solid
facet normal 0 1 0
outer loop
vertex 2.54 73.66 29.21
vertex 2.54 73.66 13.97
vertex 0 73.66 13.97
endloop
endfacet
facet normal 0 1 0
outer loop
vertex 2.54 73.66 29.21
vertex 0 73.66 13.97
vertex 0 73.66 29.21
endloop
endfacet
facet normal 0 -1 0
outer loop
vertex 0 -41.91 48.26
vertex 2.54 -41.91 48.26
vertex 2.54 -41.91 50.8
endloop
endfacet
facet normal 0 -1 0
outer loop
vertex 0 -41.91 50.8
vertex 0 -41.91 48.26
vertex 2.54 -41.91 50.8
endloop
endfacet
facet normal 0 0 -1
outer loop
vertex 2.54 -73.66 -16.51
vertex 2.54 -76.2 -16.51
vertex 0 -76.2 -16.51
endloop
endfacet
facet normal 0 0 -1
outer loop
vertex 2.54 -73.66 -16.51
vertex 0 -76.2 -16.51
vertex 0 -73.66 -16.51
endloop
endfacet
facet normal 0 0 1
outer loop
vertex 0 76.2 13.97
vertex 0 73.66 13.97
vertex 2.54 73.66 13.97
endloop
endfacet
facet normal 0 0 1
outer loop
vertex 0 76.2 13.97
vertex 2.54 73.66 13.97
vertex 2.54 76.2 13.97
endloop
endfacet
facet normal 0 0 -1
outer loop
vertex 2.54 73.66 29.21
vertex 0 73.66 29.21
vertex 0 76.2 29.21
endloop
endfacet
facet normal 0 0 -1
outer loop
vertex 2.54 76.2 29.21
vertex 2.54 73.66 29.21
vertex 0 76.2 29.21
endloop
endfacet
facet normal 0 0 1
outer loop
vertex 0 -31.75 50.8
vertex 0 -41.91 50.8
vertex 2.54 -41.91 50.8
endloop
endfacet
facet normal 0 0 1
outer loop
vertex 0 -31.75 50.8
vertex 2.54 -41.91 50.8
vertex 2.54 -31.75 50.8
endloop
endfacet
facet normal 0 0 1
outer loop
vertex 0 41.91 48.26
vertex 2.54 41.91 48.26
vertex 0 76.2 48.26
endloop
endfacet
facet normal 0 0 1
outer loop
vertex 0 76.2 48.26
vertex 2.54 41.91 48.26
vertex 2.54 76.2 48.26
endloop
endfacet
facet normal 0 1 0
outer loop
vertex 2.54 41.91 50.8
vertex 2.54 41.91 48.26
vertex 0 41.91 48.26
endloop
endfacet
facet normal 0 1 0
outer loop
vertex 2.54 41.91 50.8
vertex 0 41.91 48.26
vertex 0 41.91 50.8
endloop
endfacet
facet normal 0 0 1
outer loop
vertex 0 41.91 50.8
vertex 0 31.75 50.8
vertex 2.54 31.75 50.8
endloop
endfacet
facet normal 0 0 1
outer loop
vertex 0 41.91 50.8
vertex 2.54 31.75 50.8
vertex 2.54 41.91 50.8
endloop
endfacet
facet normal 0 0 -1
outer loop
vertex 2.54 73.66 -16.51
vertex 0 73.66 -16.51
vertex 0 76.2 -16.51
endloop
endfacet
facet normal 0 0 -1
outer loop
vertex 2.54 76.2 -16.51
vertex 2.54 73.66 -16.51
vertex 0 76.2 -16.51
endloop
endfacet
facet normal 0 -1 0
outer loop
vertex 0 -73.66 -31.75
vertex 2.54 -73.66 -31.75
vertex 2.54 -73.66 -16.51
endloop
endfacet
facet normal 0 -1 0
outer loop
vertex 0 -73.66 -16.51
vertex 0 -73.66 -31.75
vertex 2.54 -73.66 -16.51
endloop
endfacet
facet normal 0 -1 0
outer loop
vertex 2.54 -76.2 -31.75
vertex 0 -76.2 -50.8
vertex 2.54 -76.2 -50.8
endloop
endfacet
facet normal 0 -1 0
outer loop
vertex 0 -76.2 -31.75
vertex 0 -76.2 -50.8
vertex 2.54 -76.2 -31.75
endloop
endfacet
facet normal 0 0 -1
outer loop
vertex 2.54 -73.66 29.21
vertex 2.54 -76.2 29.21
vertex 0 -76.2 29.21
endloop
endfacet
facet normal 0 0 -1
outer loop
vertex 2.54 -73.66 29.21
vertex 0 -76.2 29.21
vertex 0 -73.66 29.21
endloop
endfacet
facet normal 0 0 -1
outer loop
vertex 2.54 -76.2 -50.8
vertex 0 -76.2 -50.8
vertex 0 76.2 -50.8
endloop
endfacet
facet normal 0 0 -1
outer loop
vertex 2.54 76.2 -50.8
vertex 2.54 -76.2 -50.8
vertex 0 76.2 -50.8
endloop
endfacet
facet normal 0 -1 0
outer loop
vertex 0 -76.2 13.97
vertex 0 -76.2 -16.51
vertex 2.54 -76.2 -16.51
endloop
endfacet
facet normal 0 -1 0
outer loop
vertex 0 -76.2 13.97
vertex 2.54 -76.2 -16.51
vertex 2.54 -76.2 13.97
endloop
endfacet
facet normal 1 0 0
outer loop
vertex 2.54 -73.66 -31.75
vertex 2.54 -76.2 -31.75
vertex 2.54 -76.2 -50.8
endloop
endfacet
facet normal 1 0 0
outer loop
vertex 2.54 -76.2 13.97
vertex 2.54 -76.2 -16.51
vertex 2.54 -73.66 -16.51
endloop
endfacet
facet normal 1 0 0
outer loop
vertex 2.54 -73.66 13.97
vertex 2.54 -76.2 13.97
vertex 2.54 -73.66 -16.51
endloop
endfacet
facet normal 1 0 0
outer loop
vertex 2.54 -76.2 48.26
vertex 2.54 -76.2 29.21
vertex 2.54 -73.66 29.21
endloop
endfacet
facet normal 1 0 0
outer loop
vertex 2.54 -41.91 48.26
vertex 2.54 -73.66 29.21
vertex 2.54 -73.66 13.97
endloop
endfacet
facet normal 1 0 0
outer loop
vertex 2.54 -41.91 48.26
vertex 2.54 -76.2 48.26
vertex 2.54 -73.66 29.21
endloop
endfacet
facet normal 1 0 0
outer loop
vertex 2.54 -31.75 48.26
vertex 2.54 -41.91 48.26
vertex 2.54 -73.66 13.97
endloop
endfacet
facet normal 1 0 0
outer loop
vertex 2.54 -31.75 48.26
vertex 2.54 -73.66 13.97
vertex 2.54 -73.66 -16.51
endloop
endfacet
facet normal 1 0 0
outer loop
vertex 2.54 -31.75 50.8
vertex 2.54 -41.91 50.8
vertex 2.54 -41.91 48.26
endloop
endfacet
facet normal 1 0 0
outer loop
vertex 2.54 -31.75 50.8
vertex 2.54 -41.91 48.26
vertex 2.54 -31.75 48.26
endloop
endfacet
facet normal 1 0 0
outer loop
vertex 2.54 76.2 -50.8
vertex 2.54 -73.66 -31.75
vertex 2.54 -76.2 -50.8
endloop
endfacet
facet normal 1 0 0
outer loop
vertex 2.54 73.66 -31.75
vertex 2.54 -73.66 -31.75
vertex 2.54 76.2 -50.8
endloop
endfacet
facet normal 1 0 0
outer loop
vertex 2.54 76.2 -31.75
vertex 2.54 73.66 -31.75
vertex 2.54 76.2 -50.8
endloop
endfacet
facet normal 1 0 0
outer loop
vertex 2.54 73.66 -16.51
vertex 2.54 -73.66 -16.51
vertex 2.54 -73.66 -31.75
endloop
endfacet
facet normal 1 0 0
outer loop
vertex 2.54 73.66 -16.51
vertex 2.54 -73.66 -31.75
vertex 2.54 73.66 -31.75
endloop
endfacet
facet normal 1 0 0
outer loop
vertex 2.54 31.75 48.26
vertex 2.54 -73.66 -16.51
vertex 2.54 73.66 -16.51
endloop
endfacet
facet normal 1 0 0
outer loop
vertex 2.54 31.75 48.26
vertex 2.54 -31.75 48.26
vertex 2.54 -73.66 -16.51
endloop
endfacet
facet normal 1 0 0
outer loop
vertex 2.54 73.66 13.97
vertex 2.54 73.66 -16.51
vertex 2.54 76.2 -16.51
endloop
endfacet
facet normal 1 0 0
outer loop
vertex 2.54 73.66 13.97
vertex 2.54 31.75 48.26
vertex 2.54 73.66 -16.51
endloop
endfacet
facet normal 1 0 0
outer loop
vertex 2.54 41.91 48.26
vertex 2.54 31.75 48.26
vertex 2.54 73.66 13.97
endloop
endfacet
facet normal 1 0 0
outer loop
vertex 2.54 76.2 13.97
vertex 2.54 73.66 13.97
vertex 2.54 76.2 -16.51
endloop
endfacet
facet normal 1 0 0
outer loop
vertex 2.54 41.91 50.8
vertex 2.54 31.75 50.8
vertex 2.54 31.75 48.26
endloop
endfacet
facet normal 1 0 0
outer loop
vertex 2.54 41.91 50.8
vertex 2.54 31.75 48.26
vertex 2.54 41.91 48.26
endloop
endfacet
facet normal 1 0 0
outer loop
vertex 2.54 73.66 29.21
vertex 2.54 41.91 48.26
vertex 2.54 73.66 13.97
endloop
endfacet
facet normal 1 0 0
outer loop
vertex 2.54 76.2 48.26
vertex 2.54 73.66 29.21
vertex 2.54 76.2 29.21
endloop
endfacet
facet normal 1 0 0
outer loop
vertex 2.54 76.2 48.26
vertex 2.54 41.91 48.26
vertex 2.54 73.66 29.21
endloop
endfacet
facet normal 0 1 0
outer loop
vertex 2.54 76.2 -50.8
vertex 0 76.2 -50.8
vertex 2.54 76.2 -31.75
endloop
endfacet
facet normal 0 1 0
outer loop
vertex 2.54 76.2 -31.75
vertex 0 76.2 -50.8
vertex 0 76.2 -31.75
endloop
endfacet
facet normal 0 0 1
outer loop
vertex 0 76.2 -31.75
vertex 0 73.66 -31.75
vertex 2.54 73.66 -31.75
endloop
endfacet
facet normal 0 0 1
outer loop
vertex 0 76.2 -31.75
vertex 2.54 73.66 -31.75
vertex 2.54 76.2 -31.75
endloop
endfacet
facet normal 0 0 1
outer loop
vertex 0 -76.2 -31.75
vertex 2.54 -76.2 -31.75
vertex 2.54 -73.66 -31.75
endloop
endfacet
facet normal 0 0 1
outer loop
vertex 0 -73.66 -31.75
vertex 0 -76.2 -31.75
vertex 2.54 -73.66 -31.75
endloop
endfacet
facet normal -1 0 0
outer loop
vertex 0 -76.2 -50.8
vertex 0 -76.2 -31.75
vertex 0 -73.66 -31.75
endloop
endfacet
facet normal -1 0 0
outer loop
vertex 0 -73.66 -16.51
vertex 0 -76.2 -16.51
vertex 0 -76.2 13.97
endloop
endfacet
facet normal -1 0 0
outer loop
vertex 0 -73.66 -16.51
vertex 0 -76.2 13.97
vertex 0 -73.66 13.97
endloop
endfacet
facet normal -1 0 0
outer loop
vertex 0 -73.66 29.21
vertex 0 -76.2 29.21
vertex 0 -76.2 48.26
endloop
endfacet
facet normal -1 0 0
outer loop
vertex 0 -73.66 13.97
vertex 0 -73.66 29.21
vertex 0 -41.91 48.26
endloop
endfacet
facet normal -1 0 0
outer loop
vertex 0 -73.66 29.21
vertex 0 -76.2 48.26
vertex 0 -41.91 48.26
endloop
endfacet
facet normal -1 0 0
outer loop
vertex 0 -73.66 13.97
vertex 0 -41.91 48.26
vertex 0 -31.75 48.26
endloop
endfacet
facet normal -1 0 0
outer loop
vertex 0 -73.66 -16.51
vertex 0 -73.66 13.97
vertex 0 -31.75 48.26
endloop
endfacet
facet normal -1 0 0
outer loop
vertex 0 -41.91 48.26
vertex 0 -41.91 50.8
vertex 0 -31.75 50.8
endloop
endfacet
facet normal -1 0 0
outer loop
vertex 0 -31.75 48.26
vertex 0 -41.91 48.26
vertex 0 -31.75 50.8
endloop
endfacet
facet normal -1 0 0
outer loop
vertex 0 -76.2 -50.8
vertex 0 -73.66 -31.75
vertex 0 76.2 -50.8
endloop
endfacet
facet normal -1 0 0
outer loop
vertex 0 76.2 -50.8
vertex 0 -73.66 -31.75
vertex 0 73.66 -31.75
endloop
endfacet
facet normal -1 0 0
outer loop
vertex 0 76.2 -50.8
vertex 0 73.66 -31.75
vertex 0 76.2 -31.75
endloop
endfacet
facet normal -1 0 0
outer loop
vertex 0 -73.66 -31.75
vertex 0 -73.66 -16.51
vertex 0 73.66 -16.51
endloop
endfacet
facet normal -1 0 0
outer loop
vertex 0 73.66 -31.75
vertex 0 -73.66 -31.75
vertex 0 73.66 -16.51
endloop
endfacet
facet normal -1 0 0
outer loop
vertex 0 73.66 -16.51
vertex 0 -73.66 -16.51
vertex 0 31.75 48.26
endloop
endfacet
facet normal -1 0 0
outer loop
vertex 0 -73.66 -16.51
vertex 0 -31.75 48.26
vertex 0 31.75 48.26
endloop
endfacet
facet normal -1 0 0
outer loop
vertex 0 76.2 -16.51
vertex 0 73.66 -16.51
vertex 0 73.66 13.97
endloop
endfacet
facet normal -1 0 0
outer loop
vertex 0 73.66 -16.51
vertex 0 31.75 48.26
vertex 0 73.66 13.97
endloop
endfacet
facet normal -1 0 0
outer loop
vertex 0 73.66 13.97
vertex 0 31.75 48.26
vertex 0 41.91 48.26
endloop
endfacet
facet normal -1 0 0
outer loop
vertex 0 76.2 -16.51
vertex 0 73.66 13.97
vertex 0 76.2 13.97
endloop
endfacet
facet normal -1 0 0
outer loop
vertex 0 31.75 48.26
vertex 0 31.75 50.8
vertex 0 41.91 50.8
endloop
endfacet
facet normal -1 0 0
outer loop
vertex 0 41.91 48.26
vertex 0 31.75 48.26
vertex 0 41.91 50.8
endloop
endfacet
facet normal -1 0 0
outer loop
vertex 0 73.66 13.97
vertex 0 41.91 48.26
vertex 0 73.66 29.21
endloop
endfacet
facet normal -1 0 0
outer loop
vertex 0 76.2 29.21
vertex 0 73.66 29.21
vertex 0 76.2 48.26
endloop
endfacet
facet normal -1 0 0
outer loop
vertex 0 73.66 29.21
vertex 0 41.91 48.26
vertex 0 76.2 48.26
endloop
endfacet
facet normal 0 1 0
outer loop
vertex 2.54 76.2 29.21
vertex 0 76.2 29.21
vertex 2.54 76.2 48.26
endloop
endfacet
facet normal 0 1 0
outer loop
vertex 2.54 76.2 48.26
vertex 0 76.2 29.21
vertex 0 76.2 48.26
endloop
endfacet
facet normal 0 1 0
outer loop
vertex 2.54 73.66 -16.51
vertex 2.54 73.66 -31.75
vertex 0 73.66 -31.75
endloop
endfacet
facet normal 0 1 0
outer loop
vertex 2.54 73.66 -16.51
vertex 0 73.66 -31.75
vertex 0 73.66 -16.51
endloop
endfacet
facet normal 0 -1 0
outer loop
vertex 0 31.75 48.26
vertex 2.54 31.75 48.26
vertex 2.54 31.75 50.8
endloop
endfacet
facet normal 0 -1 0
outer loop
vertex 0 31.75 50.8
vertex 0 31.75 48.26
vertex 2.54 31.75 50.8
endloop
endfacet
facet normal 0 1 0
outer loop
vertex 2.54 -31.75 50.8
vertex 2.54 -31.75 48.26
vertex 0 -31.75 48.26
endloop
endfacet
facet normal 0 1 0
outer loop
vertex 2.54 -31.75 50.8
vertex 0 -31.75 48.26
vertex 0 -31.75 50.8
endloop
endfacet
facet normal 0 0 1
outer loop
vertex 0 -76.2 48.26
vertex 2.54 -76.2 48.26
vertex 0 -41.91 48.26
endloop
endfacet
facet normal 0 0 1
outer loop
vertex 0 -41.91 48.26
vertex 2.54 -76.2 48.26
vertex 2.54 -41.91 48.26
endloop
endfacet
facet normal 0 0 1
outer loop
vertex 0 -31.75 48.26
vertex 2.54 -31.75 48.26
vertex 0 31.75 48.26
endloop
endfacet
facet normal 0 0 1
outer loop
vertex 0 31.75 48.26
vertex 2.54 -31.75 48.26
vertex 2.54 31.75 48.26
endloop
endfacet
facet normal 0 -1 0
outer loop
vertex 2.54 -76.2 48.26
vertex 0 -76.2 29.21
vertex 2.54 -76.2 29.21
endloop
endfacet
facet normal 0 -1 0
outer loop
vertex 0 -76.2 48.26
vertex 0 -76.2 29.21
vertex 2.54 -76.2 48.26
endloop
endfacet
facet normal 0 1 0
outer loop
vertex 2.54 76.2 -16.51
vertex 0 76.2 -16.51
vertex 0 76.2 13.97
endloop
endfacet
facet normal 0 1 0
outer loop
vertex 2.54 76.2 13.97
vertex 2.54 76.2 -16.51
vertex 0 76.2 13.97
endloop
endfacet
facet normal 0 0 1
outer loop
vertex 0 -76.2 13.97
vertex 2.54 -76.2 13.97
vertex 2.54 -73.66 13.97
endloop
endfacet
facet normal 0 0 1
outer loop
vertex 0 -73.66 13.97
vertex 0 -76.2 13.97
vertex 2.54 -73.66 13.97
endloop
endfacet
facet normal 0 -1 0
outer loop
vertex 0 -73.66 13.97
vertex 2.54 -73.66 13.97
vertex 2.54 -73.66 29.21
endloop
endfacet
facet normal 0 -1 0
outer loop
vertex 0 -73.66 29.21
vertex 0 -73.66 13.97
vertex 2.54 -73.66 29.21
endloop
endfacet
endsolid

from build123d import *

# Parameters (mm, degrees)
F0_W     = 152.4
F0_H     = 101.6
F1_DEPTH = 2.54
F2_W     = 34.29
F2_H     = 2.54
F2_W_2   = 63.5
F3_DEPTH = 25.4
F4_W     = 2.54
F4_H     = 15.24
F5_DEPTH = 25.4
F6_W     = 2.54
F6_H     = 15.24
F7_DEPTH = 25.4


with BuildPart() as f1:
    # F0 (on Right) → F1 (new body)
    with BuildSketch(Plane.YZ):
        Rectangle(F0_W, F0_H)
    extrude(amount=F1_DEPTH)

    # F2 (on face) → F3 (cut)
    with BuildSketch(Plane.YZ.offset(2.54)):
        with Locations((-59.055, 49.53)):
            Rectangle(F2_W, F2_H)
        with Locations((0, 49.53)):
            Rectangle(F2_W_2, F2_H)
        with Locations((59.055, 49.53)):
            Rectangle(F2_W, F2_H)
    extrude(amount=-F3_DEPTH, mode=Mode.SUBTRACT)

    # F4 (on face) → F5 (cut)
    with BuildSketch(Plane.YZ.offset(2.54)):
        with Locations((74.93, 21.59)):
            Rectangle(F4_W, F4_H)
        with Locations((74.93, -24.13)):
            Rectangle(F4_W, F4_H)
    extrude(amount=-F5_DEPTH, mode=Mode.SUBTRACT)

    # F6 (on face) → F7 (cut)
    with BuildSketch(Plane.YZ.offset(2.54)):
        with Locations((-74.93, 21.59)):
            Rectangle(F6_W, F6_H)
        with Locations((-74.93, -24.13)):
            Rectangle(F6_W, F6_H)
    extrude(amount=-F7_DEPTH, mode=Mode.SUBTRACT)


solid = f1.part
